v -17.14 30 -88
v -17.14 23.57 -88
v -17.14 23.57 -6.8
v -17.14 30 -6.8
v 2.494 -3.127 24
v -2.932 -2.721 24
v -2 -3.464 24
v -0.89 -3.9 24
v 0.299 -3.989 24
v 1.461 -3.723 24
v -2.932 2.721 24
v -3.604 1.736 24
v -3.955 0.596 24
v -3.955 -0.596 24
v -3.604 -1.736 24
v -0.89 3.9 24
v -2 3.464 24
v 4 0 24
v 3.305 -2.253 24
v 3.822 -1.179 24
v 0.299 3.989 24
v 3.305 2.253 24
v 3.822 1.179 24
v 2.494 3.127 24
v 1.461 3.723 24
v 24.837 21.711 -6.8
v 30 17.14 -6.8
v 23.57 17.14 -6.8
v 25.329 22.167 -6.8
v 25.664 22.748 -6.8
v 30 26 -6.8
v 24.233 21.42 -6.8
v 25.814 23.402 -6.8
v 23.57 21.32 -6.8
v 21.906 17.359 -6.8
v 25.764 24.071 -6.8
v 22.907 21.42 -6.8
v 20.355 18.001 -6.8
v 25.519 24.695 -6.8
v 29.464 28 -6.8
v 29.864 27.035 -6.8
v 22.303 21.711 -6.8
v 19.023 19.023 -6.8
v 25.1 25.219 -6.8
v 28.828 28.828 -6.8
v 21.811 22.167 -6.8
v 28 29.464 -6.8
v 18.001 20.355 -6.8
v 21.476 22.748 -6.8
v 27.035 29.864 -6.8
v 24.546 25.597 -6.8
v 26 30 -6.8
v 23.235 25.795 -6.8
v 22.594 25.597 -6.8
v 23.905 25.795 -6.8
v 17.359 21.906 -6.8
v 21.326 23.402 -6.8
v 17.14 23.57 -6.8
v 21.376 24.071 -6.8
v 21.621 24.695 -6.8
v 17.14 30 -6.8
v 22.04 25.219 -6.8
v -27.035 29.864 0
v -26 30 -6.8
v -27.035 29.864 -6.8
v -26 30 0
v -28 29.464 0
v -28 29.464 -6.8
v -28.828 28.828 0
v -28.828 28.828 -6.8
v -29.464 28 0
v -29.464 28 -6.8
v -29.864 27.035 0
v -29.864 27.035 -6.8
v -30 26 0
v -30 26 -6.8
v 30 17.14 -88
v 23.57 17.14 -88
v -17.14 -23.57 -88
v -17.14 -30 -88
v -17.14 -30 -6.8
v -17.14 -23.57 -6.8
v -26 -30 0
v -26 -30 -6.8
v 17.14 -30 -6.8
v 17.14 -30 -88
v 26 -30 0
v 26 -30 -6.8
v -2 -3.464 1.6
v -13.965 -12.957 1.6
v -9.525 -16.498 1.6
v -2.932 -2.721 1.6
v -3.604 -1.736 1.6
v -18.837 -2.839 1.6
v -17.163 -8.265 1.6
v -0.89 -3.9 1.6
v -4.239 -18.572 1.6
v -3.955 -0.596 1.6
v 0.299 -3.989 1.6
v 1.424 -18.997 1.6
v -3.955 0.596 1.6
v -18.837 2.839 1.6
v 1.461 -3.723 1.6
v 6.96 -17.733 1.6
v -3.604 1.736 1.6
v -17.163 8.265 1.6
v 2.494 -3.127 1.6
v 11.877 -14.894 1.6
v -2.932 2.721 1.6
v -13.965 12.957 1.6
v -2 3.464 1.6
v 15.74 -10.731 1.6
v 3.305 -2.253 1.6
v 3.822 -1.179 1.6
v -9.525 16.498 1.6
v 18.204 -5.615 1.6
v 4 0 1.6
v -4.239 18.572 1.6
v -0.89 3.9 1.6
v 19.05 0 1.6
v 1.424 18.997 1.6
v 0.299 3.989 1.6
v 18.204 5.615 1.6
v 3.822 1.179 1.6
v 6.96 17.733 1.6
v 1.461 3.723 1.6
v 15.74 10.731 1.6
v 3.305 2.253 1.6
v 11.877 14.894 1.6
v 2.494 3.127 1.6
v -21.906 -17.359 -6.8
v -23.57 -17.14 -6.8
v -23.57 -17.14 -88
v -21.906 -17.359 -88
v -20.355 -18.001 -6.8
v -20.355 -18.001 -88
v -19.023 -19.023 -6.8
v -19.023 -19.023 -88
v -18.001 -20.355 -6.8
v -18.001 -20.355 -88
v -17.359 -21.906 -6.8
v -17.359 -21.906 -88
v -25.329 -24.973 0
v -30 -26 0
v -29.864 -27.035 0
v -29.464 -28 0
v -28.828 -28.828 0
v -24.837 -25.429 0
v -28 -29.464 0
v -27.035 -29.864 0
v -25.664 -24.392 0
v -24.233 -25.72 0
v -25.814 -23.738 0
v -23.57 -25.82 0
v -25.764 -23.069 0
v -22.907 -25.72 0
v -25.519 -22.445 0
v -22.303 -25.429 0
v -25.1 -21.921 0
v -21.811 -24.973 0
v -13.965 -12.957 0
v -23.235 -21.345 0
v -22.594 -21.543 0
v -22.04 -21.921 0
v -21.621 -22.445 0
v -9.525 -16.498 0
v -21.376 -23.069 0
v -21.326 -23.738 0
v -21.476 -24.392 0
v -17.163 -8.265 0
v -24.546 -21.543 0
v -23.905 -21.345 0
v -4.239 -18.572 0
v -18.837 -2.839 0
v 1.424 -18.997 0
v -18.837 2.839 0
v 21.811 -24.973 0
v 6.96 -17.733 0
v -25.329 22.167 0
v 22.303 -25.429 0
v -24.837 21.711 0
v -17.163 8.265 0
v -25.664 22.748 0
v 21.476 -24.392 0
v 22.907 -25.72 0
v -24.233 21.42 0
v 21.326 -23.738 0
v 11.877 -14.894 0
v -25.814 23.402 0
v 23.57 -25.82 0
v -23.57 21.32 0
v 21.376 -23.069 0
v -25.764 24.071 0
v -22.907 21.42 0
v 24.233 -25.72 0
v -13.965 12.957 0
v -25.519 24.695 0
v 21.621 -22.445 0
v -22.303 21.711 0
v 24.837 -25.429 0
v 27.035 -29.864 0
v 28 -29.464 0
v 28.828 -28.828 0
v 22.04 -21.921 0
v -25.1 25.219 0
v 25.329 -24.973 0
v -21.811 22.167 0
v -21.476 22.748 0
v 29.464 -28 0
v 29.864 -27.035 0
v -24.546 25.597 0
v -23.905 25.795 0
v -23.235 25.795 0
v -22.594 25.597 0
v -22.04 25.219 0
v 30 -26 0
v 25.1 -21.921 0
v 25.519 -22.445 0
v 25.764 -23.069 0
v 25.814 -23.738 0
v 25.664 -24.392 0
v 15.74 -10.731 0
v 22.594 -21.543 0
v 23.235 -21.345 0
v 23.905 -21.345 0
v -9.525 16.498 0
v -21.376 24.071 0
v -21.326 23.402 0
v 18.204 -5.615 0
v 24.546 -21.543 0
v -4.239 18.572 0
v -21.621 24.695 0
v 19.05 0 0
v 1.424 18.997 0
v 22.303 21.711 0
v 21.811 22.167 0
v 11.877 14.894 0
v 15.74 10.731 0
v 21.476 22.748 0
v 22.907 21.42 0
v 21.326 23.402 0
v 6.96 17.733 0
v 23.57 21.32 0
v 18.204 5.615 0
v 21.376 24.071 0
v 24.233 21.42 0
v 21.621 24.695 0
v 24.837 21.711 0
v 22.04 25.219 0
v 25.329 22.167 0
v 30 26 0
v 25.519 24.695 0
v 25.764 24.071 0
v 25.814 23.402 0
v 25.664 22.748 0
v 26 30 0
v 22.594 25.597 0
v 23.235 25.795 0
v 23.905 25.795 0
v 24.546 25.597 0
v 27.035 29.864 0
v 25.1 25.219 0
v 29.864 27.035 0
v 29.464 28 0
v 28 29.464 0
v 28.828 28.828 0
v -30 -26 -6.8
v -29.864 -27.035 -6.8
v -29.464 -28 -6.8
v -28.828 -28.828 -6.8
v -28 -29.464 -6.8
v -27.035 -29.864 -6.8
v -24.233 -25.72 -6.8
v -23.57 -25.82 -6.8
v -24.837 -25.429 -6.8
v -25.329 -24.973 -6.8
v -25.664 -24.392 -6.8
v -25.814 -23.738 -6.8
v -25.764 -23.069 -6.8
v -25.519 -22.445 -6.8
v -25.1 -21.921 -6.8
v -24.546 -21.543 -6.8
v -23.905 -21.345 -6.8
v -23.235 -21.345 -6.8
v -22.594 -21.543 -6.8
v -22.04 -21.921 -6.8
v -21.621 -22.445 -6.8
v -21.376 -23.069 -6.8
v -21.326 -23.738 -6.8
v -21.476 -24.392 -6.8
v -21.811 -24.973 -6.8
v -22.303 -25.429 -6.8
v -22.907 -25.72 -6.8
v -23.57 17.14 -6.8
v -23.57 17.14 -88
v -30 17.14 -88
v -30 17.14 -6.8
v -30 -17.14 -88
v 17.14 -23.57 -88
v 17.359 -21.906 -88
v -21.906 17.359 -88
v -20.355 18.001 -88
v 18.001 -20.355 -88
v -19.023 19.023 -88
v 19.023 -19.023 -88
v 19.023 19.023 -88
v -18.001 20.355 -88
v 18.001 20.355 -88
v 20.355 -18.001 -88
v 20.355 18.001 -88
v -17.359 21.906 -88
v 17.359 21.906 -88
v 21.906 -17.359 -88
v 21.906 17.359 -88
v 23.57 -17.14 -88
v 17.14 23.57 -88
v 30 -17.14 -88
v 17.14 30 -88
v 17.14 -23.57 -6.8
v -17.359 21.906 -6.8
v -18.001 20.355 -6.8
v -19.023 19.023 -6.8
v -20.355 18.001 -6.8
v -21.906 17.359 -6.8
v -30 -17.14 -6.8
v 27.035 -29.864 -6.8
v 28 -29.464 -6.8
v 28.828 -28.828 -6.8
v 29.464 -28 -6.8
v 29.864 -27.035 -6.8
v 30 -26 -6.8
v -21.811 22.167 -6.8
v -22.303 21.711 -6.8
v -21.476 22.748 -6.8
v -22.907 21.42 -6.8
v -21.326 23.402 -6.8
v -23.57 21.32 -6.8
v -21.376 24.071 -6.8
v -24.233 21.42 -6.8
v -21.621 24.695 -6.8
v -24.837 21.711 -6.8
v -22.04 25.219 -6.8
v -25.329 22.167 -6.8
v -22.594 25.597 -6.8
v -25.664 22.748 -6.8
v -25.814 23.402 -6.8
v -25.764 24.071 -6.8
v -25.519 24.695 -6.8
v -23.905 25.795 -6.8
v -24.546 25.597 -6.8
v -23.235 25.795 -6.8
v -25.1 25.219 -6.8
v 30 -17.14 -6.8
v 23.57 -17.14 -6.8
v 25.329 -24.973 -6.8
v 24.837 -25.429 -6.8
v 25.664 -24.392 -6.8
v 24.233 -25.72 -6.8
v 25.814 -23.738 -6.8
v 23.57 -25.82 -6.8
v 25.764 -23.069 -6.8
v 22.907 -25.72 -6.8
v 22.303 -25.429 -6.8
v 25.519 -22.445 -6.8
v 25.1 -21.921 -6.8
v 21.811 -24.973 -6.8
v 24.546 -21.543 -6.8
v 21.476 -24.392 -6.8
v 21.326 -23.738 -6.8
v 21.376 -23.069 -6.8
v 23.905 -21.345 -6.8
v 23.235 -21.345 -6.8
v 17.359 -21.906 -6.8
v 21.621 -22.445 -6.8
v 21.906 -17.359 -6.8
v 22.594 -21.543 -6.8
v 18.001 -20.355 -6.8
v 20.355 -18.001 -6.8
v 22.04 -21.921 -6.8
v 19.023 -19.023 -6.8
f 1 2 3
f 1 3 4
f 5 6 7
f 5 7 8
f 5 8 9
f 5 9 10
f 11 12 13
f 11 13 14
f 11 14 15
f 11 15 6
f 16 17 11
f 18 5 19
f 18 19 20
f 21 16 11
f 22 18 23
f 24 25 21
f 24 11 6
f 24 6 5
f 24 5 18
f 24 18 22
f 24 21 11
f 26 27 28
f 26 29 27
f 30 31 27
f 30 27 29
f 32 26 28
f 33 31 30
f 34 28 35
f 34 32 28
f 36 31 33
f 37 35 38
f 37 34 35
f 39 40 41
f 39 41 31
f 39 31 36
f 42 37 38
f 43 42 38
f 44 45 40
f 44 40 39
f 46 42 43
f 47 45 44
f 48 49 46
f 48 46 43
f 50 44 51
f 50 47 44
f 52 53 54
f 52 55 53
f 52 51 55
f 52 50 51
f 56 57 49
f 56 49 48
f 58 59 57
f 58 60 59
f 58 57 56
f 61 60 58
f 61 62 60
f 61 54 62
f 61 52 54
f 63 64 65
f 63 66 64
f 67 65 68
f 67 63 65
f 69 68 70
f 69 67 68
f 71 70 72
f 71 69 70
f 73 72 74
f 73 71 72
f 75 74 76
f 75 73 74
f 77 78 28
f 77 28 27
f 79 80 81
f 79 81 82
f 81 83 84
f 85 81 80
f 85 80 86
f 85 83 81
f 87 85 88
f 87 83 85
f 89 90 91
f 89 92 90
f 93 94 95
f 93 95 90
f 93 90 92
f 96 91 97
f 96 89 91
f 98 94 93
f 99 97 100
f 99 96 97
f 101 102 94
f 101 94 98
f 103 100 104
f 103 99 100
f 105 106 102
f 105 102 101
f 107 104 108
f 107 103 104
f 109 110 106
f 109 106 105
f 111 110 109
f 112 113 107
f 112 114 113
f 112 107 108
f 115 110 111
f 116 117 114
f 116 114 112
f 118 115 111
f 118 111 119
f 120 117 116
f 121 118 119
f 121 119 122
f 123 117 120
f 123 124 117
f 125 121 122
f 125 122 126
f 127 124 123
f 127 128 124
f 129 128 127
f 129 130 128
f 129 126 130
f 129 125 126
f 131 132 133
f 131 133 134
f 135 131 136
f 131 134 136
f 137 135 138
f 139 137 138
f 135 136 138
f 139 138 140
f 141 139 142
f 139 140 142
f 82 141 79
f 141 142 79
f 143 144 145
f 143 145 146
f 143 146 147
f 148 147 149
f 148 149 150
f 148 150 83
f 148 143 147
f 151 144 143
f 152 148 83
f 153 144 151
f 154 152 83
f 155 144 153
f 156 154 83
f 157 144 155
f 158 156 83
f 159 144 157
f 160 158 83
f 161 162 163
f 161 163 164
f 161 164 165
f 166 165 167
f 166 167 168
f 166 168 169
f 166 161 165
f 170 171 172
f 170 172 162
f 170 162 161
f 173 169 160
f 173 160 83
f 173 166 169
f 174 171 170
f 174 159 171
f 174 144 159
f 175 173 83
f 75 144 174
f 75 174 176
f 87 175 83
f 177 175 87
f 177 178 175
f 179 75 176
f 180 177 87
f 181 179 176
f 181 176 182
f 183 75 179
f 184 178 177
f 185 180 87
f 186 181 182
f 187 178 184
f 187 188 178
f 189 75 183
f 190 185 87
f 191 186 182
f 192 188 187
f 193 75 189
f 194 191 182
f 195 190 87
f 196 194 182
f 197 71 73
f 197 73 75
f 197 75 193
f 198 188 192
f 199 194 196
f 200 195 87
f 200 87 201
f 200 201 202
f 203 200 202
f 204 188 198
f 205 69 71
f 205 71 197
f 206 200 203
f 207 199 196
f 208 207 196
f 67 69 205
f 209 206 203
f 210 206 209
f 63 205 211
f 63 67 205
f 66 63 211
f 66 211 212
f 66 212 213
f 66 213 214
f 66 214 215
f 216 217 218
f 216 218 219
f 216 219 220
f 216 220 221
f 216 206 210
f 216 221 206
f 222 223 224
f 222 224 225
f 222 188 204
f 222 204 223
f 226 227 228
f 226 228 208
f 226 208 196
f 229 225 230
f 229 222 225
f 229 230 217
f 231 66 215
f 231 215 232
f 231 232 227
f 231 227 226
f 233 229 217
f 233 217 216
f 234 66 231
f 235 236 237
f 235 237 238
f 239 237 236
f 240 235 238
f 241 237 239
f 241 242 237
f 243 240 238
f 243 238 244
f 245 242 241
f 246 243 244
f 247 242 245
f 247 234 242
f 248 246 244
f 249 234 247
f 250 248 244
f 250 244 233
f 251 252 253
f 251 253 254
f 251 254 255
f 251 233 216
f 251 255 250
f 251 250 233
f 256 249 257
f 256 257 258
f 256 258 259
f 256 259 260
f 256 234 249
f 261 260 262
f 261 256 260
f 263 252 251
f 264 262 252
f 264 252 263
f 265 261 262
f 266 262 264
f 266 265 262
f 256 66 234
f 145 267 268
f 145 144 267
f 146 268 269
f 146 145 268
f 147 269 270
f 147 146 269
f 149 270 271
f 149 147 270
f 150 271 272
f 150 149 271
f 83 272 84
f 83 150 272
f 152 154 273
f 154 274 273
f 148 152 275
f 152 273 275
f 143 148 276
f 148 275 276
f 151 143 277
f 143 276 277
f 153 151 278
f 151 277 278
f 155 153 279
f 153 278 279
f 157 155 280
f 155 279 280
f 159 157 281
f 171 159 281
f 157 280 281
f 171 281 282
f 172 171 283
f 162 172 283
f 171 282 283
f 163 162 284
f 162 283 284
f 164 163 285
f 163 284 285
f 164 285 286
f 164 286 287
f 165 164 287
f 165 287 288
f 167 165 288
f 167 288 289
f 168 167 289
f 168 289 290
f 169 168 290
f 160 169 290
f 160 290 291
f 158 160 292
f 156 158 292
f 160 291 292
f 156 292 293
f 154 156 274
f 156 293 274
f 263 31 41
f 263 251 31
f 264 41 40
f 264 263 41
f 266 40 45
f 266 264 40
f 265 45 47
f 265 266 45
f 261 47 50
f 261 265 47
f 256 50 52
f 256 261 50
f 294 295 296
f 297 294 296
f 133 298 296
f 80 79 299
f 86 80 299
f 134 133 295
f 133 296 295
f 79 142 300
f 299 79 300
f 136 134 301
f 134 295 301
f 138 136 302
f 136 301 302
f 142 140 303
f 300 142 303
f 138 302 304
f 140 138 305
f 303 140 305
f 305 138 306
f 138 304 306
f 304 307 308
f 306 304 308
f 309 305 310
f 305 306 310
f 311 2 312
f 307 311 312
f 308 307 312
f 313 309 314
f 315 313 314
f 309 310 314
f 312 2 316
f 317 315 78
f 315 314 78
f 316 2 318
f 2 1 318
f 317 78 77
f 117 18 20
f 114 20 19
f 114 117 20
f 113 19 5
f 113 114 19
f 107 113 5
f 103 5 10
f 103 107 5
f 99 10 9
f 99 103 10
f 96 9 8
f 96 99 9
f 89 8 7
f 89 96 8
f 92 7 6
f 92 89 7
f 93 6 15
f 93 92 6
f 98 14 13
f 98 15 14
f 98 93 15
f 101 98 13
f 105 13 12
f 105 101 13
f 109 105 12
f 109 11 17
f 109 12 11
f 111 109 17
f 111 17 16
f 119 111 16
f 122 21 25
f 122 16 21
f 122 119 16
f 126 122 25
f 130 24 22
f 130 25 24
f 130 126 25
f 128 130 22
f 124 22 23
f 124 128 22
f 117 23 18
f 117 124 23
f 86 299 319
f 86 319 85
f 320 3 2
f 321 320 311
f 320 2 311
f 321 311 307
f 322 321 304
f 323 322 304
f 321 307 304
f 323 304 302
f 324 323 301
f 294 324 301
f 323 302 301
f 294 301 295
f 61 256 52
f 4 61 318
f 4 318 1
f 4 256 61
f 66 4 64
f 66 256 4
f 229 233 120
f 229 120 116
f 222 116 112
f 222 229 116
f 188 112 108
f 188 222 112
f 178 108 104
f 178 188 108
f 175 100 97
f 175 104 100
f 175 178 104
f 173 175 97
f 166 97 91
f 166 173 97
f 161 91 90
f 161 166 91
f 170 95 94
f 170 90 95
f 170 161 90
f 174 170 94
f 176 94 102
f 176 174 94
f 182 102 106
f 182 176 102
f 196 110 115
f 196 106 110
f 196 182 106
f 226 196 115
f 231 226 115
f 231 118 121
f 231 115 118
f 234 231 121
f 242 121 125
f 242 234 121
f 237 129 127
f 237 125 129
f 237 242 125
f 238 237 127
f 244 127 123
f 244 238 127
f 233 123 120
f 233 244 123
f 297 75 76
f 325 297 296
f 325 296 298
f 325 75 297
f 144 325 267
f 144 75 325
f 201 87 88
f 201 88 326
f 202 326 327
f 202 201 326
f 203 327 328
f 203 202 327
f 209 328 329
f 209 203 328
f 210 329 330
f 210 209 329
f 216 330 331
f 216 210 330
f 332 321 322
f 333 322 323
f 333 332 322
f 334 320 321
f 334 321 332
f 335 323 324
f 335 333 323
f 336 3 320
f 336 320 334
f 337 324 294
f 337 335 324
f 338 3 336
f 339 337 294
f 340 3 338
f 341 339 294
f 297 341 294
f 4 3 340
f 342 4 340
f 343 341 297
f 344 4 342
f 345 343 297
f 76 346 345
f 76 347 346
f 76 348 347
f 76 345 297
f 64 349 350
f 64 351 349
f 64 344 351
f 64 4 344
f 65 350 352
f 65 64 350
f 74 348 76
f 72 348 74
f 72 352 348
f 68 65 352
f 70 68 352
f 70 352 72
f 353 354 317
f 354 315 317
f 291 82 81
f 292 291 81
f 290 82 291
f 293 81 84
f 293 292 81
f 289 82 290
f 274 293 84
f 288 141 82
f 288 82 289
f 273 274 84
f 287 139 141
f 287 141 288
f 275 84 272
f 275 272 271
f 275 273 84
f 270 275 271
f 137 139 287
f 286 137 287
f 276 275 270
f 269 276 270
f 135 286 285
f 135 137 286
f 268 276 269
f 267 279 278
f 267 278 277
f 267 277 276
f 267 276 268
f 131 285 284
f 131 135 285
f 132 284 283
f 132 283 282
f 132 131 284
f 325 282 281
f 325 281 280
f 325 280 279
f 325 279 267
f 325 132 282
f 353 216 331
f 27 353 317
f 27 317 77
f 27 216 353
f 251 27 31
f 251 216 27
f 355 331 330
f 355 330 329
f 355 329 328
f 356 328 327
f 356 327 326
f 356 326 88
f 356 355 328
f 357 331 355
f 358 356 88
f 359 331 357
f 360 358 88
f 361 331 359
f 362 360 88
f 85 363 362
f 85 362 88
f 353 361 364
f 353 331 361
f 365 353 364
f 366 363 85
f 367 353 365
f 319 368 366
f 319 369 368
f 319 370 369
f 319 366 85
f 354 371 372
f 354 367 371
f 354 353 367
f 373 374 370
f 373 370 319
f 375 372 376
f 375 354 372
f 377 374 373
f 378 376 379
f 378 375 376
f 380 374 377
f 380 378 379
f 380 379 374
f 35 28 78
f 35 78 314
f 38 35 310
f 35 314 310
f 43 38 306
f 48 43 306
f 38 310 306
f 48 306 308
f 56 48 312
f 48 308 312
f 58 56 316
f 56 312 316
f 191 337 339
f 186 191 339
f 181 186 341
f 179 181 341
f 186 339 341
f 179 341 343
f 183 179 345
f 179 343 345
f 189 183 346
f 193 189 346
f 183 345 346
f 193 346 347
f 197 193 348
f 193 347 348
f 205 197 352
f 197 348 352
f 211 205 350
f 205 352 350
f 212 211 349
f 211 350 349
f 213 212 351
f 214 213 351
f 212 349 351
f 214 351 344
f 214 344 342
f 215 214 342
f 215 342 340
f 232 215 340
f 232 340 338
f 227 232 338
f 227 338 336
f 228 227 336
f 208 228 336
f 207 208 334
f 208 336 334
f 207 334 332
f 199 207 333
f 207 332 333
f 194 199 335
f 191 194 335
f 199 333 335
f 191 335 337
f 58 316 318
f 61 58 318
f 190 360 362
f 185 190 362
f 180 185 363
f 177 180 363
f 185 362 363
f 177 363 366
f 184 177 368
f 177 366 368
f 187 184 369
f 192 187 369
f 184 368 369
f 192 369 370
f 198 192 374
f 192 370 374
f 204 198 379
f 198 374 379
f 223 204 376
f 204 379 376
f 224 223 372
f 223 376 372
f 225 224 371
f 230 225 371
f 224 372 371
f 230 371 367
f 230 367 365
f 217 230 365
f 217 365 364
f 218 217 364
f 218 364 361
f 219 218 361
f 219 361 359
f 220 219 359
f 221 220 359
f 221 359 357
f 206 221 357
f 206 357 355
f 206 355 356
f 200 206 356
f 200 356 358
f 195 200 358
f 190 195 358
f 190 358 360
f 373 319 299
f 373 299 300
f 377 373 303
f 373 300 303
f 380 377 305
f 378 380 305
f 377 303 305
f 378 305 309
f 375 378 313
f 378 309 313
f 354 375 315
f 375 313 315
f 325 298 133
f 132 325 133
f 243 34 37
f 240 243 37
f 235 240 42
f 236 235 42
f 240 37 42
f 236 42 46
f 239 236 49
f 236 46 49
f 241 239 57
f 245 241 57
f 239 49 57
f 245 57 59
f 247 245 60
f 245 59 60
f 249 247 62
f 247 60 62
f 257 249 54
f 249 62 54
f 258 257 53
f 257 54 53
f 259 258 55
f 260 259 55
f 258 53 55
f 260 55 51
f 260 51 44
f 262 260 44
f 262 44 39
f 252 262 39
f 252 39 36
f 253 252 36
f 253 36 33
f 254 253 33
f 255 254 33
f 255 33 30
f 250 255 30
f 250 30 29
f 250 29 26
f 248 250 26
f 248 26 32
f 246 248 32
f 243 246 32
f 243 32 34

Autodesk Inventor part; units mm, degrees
ref_plane "YZ Plane" through (0, 0, 0) normal (1, 0, 0) x (0, 1, 0)
ref_plane "XZ Plane" through (0, 0, 0) normal (0, 1, 0) x (-1, 0, 0)
ref_plane "XY Plane" through (0, 0, 0) normal (0, 0, 1) x (1, 0, 0)
sketch "Skizze1" plane through (0, 0, 0) normal (0, 0, 1) x (1, 0, 0)
  line L0 (-26, -30) -> (26, -30)
  line L1 (30, -26) -> (30, 26)
  line L2 (26, 30) -> (-26, 30)
  line L3 (-30, 26) -> (-30, -26)
  line L4 (-30, -30) -> (30, 30) construction
  line L5 (30, -30) -> (-30, 30) construction
  arc A0 (30, 26) -> (26, 30) centre (26, 26) ccw
  arc A1 (26, -30) -> (30, -26) centre (26, -26) ccw
  arc A2 (-30, -26) -> (-26, -30) centre (-26, -26) ccw
  arc A3 (-26, 30) -> (-30, 26) centre (-26, 26) ccw
  point P0 (0, 0)
  dimension "d0" = 4
  dimension "d1" = 60
extrude "Extrusion1" add sketch "Skizze1" against normal blind 88
sketch "Skizze2" plane through (0, 0, 0) normal (0, 0, 1) x (1, 0, 0)
  circle A0 centre (0, 0) radius 19.05
  dimension "d4" = 38.1
extrude "Extrusion2" add sketch "Skizze2" along normal blind 1.6
sketch "Skizze4" plane through (0, 0, 0) normal (0, 0, 1) x (1, 0, 0)
  circle A0 centre (0, 0) radius 19.05 projected
  line L0 (30, 26) -> (30, -26) projected
  arc A1 (30, 26) -> (26, 30) centre (26, 26) ccw projected
  line L1 (-26, 30) -> (26, 30) projected
  arc A2 (-26, 30) -> (-30, 26) centre (-26, 26) ccw projected
  line L2 (-30, -26) -> (-30, 26) projected
  arc A3 (-30, -26) -> (-26, -30) centre (-26, -26) ccw projected
  line L3 (26, -30) -> (-26, -30) projected
  arc A4 (26, -30) -> (30, -26) centre (26, -26) ccw projected
  line L4 (26, -26) -> (-26, 26) construction
  line L5 (-23.57, 23.57) -> (23.57, 23.57) construction
  line L6 (23.57, 23.57) -> (23.57, -23.57) construction
  line L7 (23.57, -23.57) -> (-23.57, -23.57) construction
  line L8 (-23.57, -23.57) -> (-23.57, 23.57) construction
  line L9 (-23.57, 23.57) -> (23.57, -23.57) construction
  line L10 (23.57, 23.57) -> (-23.57, -23.57) construction
  dimension "d15" = 47.14
hole "Bohrung1" at (23.57, 23.57, 0) at (-23.57, 23.57, 0) at (-23.57, -23.57, 0) at (23.57, -23.57, 0) direction (0, 0, -1) diameter 4.5 end through all
sketch "Skizze5" plane through (0, 0, 1.6) normal (0, 0, 1) x (1, 0, 0)
  circle A0 centre (0, 0) radius 4
  dimension "d23" = 8
extrude "Extrusion4" add sketch "Skizze5" along normal blind 22.4
sketch "Skizze7" plane through (0, 0, -88) normal (0, 0, -1) x (-1, 0, 0)
  circle A0 centre (23.57, -23.57) radius 2.25 projected
  circle A1 centre (-23.57, 23.57) radius 2.25 projected
  circle A2 centre (23.57, 23.57) radius 2.25 projected
  circle A3 centre (-23.57, -23.57) radius 2.25 projected
  line L0 (-30, 26) -> (-30, -26) projected
  arc A4 (-30, -26) -> (-26, -30) centre (-26, -26) ccw projected
  line L1 (-26, -30) -> (26, -30) projected
  arc A5 (26, -30) -> (30, -26) centre (26, -26) ccw projected
  line L2 (30, -26) -> (30, 26) projected
  arc A6 (30, 26) -> (26, 30) centre (26, 26) ccw projected
  line L3 (26, 30) -> (-26, 30) projected
  arc A7 (-26, 30) -> (-30, 26) centre (-26, 26) ccw projected
  circle A8 centre (23.57, -23.57) radius 6.43 construction
  line L4 (30, -26) -> (30, 26) projected
  line L5 (30, -17.14) -> (23.57, -17.14)
  line L6 (-26, -30) -> (26, -30) projected
  line L7 (17.14, -30) -> (17.14, -23.57)
  arc A9 (23.57, -17.14) -> (17.14, -23.57) centre (23.57, -23.57) ccw
  arc A10 (-17.14, -23.57) -> (-23.57, -17.14) centre (-23.57, -23.57) ccw
  arc A11 (17.2019, 24.4599) -> (23.57, 17.14) centre (23.57, 23.57) ccw
  arc A12 (-23.57, 17.14) -> (-17.14, 23.57) centre (-23.57, 23.57) ccw
  line L8 (23.57, 17.14) -> (30, 17.14)
  line L9 (17.14, 23.57) -> (17.14, 30)
  line L10 (26, 30) -> (-26, 30) projected
  line L11 (-17.14, 23.57) -> (-17.14, 30)
  line L12 (-23.57, 17.14) -> (-30, 17.14)
  line L13 (-23.57, -17.14) -> (-30, -17.14)
  line L14 (-17.14, -23.57) -> (-17.14, -30)
  point P0 (0, 0)
extrude "Extrusion6" cut sketch "Skizze7" against normal blind 81.2 contours A7 L3 L11 A12 L12 L0 | L13 A10 L14 L1 A4 L0 | L3 A6 L2 L8 A11 L9 | L7 A9 L5 L2 A5 L1
sketch "Skizze8" plane through (0, 0, -88) normal (0, 0, -1) x (-1, 0, 0)
  circle A0 centre (23.57, -23.57) radius 2.25 construction
  circle A1 centre (-23.57, 23.57) radius 2.25 construction
  circle A2 centre (23.57, 23.57) radius 2.25 construction
  circle A3 centre (-23.57, -23.57) radius 2.25 construction
  circle A4 centre (0, 0) radius 19.05 construction
  line L0 (-30, 26) -> (-30, -26) construction
  arc A5 (-26, 30) -> (-30, 26) centre (-26, 26) ccw construction
  line L1 (26, 30) -> (-26, 30) construction
  arc A6 (30, 26) -> (26, 30) centre (26, 26) ccw construction
  line L2 (30, -26) -> (30, 26) construction
  arc A7 (26, -30) -> (30, -26) centre (26, -26) ccw construction
  line L3 (-26, -30) -> (26, -30) construction
  arc A8 (-30, -26) -> (-26, -30) centre (-26, -26) ccw construction
  circle A9 centre (0, 0) radius 42.4264 construction
  line L4 (30, 30) -> (-30, 30) construction
  line L5 (-30, 30) -> (-30, -30) construction
  line L6 (-30, -30) -> (30, -30) construction
  line L7 (30, -30) -> (30, 30) construction
  line L8 (30, 30) -> (-30, -30) construction
  line L9 (-30, 30) -> (30, -30) construction
  line L10 (-17.14, -30) -> (17.14, -30) construction
  line L11 (-30, 17.14) -> (-30, -17.14) construction
equation "\"d1\" = breite"
equation "\"d2\" = Laenge"
equation "\"d4\" = fit"
equation "\"d5\" = fit_l"
equation "\"d15\" = lochabstand"
equation "\"d16\" = bohrung_d"
equation "\"d23\" = schaft_d"
equation "\"d24\" = schaft_l"
equation "\"d28\" = Laenge - Mount_l"
equation "\"breite\" = 60"
equation "\"lochabstand\" = 47.14"
equation "\"schaft_d\" = 8"
equation "\"fit\" = 38.1"
equation "\"fit_l\" = 1.6"
equation "\"Mount_l\" = 6.8"
equation "\"Laenge\" = 88"
equation "\"bohrung_d\" = 4.5"
equation "\"schaft_l\" = 22.4"
properties part number "Nema24"
